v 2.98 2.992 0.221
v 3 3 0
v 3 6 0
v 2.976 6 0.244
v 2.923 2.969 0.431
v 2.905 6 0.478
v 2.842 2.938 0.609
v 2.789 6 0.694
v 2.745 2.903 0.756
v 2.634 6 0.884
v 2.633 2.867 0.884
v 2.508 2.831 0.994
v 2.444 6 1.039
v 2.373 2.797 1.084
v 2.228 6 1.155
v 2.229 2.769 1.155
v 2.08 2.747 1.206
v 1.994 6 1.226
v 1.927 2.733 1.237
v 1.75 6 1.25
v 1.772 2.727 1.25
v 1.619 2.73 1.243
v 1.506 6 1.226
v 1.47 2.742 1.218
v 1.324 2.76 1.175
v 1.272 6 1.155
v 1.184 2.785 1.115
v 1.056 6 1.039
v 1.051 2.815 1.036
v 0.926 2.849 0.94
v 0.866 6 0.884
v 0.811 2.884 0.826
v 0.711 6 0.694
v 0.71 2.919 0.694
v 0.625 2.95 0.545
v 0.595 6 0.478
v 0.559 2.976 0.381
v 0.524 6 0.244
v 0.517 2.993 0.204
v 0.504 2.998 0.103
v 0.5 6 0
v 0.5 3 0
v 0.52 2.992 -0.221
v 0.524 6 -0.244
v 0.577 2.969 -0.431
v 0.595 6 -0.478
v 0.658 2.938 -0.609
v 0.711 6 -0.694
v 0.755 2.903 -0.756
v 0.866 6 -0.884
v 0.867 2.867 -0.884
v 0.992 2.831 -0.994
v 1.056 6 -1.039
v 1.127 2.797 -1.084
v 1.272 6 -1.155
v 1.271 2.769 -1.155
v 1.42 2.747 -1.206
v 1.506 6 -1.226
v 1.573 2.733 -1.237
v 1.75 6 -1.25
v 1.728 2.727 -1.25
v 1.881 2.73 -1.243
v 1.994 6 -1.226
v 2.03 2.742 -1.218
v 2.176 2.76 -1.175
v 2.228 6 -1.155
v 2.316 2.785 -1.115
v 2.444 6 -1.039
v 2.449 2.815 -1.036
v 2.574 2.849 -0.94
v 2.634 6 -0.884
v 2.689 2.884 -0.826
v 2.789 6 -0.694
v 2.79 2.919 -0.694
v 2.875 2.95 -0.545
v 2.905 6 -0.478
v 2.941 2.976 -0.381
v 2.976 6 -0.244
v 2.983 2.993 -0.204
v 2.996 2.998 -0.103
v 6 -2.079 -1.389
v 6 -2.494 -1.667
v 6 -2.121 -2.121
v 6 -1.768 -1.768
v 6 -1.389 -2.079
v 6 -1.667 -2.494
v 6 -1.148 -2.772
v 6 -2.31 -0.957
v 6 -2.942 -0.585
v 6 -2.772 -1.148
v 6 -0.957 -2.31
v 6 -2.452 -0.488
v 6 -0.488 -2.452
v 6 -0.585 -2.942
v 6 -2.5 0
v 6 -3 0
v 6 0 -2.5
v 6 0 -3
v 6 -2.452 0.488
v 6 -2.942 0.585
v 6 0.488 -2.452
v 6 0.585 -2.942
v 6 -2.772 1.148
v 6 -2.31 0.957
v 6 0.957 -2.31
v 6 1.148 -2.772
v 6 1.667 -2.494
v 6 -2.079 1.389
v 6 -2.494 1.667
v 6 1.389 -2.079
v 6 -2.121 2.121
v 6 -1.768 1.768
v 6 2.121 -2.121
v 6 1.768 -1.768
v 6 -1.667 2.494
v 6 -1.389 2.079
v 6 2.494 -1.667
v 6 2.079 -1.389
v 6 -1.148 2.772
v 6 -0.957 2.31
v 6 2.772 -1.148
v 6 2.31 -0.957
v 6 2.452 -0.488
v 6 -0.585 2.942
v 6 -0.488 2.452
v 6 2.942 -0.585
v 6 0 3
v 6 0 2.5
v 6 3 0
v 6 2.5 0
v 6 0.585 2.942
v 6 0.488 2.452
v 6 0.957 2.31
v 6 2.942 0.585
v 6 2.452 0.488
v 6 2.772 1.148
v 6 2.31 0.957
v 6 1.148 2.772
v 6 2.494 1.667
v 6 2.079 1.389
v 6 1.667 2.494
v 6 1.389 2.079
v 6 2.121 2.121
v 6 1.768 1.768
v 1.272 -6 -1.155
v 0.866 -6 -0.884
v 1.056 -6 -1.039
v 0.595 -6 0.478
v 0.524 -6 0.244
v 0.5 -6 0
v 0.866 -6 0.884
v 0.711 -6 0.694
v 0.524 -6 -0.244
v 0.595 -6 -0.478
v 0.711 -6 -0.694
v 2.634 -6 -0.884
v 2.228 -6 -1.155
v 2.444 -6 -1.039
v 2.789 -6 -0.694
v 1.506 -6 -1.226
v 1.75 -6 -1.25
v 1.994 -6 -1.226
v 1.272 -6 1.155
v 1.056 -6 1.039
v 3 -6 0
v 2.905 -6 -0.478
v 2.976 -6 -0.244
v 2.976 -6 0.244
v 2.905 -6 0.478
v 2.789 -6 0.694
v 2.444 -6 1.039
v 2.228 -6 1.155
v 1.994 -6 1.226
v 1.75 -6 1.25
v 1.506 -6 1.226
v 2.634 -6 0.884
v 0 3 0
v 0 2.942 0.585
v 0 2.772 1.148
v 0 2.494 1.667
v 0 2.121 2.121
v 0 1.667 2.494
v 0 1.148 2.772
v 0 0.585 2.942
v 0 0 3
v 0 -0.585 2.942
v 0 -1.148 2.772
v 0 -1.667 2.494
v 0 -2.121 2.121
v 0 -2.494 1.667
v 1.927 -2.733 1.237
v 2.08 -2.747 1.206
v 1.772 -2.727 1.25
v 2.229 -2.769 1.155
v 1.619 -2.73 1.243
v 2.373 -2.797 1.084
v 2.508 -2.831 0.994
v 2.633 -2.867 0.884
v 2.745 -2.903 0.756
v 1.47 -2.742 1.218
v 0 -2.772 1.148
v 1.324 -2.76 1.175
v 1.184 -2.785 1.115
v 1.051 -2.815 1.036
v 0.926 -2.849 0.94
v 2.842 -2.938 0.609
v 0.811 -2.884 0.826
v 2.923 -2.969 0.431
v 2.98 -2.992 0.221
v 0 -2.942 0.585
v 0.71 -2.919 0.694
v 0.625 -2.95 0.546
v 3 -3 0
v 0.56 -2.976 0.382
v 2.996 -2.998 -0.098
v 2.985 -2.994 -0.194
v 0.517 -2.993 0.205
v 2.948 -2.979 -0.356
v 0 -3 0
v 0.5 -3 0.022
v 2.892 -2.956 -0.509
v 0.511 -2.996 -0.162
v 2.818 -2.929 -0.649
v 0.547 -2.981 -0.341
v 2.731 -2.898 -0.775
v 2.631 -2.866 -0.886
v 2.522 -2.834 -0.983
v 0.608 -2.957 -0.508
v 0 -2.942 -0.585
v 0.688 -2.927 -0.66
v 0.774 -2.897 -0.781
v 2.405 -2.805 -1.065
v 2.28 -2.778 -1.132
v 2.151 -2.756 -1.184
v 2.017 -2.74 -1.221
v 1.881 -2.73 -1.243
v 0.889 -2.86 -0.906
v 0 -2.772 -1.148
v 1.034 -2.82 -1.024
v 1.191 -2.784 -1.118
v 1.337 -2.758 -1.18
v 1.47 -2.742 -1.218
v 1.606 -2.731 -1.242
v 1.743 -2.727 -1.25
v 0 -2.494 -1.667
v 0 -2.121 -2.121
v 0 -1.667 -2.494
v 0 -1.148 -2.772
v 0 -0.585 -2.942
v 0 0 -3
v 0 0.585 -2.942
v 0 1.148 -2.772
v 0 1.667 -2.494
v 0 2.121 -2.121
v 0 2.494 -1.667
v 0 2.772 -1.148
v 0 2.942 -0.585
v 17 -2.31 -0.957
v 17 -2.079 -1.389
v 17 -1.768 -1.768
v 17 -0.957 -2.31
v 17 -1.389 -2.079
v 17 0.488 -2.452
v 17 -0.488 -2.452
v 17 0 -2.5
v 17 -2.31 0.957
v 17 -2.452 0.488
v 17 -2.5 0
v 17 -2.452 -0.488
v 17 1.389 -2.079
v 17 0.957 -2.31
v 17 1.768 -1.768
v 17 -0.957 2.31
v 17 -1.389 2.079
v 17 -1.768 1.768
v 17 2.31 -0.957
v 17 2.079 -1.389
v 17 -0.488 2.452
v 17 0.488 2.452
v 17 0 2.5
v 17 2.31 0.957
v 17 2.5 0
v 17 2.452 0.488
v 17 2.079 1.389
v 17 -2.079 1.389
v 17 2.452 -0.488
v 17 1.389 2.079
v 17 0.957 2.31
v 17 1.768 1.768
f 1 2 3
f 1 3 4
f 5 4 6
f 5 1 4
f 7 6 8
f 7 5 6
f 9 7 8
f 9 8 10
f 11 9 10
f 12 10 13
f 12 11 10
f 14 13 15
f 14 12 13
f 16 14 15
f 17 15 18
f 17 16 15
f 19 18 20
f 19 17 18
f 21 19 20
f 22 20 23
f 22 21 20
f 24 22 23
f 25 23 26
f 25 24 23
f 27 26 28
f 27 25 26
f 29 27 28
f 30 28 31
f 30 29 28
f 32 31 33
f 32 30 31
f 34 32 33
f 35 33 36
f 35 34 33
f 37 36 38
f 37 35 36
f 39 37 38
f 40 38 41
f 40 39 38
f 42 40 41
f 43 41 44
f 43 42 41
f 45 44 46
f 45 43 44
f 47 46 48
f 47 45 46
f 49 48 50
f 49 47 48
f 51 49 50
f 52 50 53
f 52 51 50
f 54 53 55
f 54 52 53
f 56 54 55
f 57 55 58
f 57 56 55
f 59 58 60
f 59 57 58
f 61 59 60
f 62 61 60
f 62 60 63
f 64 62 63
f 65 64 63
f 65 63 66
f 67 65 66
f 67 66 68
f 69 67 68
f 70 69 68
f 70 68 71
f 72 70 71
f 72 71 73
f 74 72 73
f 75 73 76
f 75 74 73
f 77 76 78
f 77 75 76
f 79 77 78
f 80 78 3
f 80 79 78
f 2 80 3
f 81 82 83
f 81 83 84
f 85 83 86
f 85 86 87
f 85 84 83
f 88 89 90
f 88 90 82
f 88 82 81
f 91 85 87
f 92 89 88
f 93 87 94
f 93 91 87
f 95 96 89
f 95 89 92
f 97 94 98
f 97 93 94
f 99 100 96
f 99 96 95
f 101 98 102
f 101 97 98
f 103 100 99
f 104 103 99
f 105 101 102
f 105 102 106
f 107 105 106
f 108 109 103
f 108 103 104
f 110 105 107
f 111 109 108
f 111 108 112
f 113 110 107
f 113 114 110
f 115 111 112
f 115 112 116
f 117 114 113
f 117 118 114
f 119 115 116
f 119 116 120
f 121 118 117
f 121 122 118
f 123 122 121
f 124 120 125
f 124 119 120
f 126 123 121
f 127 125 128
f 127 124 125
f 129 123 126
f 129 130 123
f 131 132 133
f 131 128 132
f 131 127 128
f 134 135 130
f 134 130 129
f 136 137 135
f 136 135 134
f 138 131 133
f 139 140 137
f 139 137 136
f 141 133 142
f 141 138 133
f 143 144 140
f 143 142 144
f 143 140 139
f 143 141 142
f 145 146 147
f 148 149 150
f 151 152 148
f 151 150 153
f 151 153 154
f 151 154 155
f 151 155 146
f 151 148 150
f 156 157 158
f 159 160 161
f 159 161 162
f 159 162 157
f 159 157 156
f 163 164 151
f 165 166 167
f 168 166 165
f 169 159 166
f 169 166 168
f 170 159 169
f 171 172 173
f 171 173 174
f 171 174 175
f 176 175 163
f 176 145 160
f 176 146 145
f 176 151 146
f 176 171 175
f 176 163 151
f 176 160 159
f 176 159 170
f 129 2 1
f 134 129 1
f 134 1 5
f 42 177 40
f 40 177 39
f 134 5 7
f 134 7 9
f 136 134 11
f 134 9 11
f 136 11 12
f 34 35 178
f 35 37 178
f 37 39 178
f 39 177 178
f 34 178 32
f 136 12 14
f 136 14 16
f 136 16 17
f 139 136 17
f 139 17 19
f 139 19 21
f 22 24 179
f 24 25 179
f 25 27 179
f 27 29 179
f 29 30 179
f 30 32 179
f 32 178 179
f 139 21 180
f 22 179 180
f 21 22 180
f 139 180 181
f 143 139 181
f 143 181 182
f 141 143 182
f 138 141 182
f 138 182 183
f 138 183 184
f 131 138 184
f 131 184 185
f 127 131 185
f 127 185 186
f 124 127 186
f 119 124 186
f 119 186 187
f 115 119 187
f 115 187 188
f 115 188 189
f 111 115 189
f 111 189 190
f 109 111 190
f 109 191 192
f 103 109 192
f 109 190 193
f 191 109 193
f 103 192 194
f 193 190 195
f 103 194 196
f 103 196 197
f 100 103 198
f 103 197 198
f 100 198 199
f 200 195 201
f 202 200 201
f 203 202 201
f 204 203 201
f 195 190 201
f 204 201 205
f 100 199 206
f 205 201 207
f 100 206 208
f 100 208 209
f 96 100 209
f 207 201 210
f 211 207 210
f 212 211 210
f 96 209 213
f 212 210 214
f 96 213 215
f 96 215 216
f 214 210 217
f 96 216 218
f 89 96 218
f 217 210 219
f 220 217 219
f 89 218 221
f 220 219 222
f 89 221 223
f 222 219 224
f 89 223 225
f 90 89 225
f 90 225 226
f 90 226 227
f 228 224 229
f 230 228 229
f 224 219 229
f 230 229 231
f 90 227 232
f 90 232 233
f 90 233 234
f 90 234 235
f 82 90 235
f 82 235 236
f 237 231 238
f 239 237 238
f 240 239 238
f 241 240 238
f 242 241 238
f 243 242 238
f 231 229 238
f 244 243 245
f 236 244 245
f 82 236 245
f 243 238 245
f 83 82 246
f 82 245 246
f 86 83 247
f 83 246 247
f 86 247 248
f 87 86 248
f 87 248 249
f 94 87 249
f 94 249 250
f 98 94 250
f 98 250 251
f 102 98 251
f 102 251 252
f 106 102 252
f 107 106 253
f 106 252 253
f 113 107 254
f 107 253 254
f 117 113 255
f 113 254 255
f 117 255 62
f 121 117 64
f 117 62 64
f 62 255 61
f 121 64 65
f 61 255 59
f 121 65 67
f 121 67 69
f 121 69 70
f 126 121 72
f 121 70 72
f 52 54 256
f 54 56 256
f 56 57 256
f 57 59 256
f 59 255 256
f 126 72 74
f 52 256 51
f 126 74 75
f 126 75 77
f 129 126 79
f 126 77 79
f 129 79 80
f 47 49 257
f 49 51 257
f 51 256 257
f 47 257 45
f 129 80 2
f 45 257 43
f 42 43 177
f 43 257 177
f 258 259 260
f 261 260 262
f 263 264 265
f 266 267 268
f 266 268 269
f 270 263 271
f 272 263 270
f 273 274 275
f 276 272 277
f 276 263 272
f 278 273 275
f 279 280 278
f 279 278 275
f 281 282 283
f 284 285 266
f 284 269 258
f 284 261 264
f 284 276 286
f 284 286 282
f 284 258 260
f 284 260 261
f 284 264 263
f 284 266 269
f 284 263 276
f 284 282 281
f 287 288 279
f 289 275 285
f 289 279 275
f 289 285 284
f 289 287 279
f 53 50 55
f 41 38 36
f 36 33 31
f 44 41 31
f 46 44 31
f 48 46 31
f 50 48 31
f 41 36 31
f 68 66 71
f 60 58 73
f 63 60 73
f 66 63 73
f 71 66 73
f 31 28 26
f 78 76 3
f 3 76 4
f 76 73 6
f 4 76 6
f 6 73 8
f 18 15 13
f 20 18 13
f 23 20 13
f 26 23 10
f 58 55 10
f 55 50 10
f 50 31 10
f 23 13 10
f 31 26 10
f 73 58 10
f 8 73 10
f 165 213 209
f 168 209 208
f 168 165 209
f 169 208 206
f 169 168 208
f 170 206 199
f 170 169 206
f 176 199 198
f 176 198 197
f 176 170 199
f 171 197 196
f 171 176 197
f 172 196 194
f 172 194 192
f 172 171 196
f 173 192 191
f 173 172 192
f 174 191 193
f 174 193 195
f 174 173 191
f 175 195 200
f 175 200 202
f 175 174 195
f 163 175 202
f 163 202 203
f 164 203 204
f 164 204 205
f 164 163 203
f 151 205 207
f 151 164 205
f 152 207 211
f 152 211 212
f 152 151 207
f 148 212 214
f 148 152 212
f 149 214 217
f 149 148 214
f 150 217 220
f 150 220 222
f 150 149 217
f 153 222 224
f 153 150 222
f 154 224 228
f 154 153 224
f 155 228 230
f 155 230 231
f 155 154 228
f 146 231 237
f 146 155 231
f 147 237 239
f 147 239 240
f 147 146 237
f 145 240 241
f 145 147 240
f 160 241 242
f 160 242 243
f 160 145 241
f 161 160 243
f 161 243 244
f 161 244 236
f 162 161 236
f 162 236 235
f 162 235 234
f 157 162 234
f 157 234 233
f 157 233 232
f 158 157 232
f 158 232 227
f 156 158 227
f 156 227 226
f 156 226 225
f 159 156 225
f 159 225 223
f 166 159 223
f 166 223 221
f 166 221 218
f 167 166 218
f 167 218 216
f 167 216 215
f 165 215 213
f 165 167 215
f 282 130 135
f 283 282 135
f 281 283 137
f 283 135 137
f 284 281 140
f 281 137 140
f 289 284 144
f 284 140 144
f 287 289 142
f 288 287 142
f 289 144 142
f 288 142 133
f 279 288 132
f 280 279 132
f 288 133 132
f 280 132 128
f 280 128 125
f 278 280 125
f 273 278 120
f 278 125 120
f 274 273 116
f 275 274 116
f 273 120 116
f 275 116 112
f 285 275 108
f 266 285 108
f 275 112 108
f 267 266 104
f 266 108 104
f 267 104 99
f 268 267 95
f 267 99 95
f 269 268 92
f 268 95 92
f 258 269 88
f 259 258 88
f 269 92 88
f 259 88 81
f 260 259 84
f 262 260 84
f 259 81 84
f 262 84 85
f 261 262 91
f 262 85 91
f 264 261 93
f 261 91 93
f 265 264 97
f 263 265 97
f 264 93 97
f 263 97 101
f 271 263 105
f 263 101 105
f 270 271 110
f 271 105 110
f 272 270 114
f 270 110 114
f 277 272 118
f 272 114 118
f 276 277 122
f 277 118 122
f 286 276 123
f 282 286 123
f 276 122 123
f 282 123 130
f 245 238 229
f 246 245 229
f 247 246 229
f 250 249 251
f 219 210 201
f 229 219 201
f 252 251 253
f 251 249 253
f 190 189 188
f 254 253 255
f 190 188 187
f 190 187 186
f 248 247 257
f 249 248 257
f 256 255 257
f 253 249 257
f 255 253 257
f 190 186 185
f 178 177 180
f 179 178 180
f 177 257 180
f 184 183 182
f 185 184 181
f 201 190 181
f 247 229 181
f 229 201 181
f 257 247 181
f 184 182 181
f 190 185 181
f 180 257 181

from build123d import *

# Parameters (mm, degrees)
F0_R     = 3
F1_DEPTH = 6
F2_R     = 2.5
F3_DEPTH = 11
F4_R     = 1.25
F5_DEPTH = 6


with BuildPart() as f1:
    # F0 (on Right) → F1 (new body)
    with BuildSketch(Plane.YZ):
        Circle(F0_R)
    extrude(amount=F1_DEPTH)

    # F2 (on face) → F3 (join)
    with BuildSketch(Plane.YZ.offset(6)):
        Circle(F2_R)
    extrude(amount=F3_DEPTH)

    # F4 (on Front) → F5 (join, symmetric)
    with BuildSketch(Plane.XZ):
        with Locations((1.75, 0)):
            Circle(F4_R)
    extrude(amount=F5_DEPTH, both=True)


solid = f1.part
